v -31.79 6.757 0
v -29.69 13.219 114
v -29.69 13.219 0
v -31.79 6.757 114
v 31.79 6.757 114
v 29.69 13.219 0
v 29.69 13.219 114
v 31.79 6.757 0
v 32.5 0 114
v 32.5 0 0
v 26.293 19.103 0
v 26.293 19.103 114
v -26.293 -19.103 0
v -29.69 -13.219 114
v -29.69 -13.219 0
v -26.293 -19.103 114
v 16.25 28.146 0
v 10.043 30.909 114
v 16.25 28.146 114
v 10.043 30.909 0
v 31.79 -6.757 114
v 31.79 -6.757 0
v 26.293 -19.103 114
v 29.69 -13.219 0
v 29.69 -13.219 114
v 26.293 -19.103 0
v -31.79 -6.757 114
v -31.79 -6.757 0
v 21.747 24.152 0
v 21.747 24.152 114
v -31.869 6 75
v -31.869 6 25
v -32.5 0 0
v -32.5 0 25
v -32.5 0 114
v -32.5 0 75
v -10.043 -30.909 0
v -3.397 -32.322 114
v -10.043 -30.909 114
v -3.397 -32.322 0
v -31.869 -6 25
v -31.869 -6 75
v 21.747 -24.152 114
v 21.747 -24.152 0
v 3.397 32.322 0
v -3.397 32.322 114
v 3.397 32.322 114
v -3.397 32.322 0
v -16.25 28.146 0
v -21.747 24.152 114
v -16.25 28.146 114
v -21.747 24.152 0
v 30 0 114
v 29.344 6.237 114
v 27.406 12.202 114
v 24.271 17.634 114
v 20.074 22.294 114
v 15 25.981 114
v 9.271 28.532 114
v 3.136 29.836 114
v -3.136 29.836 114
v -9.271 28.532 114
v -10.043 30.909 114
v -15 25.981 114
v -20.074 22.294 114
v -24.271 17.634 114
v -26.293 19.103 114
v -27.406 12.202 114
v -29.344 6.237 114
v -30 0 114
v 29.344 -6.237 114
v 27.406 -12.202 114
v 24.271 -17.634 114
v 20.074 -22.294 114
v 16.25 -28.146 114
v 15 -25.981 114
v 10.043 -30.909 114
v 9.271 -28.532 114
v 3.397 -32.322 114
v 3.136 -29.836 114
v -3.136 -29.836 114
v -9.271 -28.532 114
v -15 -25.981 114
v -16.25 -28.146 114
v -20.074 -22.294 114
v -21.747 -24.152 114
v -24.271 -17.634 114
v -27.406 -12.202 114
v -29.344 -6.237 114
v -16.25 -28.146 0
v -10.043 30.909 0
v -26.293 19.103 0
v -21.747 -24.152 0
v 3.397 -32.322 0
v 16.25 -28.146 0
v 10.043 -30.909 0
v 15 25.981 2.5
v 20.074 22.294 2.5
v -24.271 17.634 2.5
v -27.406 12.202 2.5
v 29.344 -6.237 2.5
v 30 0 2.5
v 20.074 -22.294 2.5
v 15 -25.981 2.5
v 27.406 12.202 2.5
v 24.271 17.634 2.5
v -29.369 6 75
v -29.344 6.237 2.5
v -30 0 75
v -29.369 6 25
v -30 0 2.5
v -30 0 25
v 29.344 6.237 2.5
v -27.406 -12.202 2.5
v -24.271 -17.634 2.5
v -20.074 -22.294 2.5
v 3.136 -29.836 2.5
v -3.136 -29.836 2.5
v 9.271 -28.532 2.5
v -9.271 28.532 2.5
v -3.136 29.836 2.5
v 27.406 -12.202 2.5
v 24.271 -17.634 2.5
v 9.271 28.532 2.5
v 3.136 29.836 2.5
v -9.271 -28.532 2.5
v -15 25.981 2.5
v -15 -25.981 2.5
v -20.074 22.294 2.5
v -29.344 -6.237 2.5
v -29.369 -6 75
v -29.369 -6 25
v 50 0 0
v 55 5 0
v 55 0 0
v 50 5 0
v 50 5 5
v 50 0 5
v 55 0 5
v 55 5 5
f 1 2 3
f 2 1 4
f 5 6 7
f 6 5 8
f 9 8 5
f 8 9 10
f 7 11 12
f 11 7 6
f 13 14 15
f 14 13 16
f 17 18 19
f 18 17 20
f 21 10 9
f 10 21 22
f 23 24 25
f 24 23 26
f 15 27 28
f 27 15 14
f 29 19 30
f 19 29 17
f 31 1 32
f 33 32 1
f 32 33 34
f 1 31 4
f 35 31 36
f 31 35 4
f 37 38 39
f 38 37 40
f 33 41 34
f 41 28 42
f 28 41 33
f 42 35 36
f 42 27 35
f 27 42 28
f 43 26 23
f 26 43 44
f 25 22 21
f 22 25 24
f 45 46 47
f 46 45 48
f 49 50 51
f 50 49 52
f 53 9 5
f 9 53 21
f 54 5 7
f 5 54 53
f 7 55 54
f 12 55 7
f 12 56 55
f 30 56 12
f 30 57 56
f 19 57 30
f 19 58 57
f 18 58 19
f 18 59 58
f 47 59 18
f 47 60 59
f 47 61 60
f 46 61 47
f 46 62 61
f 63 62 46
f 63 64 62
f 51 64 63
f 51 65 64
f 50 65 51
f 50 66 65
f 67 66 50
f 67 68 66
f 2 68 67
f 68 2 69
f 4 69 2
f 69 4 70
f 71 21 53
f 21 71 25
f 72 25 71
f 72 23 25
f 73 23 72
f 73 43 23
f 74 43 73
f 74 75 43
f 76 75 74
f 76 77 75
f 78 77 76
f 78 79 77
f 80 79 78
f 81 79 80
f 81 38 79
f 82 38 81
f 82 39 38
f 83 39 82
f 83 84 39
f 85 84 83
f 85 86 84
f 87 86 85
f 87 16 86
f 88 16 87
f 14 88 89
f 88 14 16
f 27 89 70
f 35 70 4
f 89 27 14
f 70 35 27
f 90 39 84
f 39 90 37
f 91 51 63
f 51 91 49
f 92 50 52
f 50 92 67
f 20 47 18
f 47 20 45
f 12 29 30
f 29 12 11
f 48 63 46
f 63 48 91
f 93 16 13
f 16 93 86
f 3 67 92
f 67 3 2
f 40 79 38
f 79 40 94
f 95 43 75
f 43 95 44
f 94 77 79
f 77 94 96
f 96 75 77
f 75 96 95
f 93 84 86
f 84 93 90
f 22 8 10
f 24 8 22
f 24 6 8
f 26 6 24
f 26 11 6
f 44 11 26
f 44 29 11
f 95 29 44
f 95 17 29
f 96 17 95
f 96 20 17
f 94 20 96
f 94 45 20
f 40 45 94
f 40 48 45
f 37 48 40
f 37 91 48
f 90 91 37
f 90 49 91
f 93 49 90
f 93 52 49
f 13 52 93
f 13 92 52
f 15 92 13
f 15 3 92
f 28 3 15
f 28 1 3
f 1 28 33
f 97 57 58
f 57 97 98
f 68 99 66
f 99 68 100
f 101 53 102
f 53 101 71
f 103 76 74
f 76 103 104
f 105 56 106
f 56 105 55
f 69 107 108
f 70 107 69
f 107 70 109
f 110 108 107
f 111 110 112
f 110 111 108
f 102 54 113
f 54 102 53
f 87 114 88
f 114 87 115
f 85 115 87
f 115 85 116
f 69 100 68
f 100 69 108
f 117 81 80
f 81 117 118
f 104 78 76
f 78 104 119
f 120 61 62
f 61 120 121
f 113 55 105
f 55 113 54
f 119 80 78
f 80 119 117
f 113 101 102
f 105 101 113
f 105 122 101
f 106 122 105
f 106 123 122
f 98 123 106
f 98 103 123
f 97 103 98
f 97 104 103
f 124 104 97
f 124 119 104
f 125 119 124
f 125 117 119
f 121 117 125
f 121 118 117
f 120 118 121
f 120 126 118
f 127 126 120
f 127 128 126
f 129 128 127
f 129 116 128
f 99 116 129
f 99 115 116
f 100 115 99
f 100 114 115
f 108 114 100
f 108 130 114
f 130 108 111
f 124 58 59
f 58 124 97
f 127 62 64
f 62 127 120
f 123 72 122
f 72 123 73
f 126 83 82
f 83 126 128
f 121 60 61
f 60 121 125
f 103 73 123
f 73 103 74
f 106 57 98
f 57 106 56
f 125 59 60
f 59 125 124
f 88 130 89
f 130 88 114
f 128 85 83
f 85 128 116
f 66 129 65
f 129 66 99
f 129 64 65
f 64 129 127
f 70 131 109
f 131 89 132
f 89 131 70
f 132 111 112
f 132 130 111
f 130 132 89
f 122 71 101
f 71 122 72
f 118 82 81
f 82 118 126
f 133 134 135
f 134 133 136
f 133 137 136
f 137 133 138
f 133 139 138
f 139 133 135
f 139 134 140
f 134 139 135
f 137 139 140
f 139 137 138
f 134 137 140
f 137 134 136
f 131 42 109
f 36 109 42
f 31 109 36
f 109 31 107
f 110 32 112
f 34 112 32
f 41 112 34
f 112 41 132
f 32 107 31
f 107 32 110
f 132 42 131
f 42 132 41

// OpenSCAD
$fn = 30;

prumer = 65;
vyska = 114;
stena = 2.5;

sirka_cidla = 12;
vyska_cidla = 50;

module cansat()
{
    difference()
    {
    cylinder(d = prumer, h = vyska);
    translate([0, 0, stena]) cylinder(d = prumer - 2 * stena, h = vyska);
    }
}

module otvory()
{
    color("red") translate([-prumer/2 - stena, -sirka_cidla/2, 25]) cube([stena*3, sirka_cidla, vyska_cidla]);
}

module drzak_desky()
{
    translate() cube(4);
    translate() cube(5);
}


difference()
{
    union()
    {
        cansat();
        translate([50, 0, 0]) drzak_desky();
    }
    otvory();
}
